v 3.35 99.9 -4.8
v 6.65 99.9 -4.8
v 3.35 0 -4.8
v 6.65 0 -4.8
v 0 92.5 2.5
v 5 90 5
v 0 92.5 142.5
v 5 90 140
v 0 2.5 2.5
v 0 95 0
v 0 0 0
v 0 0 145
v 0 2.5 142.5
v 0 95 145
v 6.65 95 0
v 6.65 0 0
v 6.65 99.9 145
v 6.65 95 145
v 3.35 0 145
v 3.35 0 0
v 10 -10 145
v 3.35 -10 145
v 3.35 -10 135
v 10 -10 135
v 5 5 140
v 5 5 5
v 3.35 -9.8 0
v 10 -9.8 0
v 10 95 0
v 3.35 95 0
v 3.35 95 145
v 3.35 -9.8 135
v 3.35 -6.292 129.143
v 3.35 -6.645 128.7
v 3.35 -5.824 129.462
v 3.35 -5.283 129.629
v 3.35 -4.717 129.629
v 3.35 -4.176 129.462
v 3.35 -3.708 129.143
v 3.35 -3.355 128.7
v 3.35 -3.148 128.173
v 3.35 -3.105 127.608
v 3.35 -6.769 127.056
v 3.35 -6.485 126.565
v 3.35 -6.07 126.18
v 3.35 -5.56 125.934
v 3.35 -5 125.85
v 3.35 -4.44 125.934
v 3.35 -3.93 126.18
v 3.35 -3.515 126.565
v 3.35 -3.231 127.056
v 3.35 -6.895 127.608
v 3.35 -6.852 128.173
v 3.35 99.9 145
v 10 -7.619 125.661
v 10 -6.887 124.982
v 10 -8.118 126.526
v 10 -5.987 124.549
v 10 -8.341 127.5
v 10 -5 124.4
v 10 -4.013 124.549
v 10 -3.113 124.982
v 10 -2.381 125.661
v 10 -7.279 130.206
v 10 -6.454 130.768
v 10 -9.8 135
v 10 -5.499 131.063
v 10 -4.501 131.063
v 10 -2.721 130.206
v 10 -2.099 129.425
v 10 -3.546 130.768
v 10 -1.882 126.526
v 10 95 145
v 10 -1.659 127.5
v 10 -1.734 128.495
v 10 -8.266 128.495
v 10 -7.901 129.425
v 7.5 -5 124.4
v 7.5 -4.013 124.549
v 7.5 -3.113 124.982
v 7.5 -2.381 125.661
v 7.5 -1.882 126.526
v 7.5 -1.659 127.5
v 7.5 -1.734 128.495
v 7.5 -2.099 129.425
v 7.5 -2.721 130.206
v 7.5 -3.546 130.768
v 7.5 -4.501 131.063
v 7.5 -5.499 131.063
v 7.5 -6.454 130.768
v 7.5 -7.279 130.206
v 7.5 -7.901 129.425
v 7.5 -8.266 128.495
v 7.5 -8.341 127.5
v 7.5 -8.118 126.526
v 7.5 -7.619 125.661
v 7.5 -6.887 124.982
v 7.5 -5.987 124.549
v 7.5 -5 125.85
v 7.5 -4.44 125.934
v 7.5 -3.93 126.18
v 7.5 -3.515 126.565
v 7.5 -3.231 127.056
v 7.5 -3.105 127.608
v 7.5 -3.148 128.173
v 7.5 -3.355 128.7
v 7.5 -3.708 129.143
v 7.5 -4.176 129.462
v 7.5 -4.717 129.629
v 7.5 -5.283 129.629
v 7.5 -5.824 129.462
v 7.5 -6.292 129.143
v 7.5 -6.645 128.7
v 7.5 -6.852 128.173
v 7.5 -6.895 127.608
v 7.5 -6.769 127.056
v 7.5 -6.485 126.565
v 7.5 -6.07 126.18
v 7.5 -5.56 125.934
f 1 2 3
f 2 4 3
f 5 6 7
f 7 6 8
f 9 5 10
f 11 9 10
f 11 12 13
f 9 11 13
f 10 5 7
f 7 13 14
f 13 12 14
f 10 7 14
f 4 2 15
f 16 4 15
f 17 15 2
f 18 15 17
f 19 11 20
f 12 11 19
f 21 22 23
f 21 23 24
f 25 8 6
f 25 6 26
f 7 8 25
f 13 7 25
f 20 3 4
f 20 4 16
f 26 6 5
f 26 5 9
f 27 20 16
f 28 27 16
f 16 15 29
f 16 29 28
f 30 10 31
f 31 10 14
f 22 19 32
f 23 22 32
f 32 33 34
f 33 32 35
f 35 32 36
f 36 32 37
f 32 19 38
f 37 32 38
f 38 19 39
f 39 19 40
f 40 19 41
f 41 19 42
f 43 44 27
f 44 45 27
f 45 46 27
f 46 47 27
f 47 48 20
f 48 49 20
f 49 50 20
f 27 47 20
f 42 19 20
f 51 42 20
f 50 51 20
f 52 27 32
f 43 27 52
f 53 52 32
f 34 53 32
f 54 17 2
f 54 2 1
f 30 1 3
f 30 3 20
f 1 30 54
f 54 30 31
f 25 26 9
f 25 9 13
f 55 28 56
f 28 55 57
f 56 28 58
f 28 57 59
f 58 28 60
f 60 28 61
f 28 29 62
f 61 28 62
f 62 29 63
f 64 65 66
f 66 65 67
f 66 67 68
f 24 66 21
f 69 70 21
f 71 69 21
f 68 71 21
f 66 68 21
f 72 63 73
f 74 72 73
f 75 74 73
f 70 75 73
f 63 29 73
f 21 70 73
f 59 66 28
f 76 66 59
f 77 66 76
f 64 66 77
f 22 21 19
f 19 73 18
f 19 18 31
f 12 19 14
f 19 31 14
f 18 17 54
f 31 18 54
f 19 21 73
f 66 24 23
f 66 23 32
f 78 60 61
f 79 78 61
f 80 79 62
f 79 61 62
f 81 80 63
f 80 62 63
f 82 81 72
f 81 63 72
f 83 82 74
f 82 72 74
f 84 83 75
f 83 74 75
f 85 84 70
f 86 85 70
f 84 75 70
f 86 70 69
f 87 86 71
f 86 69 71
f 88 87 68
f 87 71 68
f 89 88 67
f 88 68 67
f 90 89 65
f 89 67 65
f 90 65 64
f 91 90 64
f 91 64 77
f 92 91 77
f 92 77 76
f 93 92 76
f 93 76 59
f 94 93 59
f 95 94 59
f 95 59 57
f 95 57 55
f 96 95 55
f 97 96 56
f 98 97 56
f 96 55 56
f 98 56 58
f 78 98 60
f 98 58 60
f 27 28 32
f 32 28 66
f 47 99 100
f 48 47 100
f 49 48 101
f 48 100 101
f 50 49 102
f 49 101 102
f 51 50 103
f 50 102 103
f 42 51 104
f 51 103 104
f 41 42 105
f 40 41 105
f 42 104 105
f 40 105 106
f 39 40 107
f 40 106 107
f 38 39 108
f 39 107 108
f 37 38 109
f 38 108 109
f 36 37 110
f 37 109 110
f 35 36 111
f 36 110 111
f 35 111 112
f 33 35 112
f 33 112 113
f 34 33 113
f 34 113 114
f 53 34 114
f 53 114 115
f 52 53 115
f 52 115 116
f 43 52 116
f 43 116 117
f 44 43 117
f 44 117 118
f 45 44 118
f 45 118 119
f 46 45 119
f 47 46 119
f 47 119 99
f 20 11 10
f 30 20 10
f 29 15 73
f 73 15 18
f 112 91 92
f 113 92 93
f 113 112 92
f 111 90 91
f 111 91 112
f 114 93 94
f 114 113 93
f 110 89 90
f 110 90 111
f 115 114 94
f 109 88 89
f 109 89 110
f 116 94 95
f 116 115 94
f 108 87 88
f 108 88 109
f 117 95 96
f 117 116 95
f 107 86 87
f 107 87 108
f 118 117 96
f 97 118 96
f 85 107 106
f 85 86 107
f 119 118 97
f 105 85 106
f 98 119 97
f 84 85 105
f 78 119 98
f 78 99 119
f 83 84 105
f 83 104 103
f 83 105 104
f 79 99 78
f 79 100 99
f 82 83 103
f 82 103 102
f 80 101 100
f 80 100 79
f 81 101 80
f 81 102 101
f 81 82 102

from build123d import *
from OCP.BRepFilletAPI import BRepFilletAPI_MakeChamfer

# Parameters (mm, degrees)
SKETCH2_W           = 95
SKETCH2_H           = 145
BOSS_EXTRUDE1_DEPTH = 10
SKETCH3_W           = 3.3
SKETCH3_H           = 4.8
BOSS_EXTRUDE3_DEPTH = 95
SKETCH4_W           = 3.3
SKETCH4_H           = 149.8
BOSS_EXTRUDE4_DEPTH = 4.9
BOSS_EXTRUDE5_DEPTH = 10
CUT_EXTRUDE1_REACH  = 178.366
SKETCH6_R           = 1.9
SKETCH8_R           = 3.35
CUT_EXTRUDE3_DEPTH  = 2.5
CUT_EXTRUDE2_REACH  = 178.366
SKETCH7_W           = 0.2
SKETCH7_H           = 135
SKETCH9_W           = 85
SKETCH9_H           = 135
CUT_EXTRUDE4_DEPTH  = 5
CHAMFER1_SIZE       = 2.5
CHAMFER1_SIZE_2     = 5


with BuildPart() as part:
    # Sketch2 → Boss-Extrude1 (new body)
    with BuildSketch(Plane.YZ):
        with Locations((47.5, 72.5)):
            Rectangle(SKETCH2_W, SKETCH2_H)
    extrude(amount=BOSS_EXTRUDE1_DEPTH)

    # Sketch3 → Boss-Extrude3 (add)
    with BuildSketch(Plane(origin=(0, 95, 0), x_dir=(-1, 0, 0), z_dir=(0, 1, 0))):
        with Locations((-5, -2.4)):
            Rectangle(SKETCH3_W, SKETCH3_H)
    extrude(amount=-BOSS_EXTRUDE3_DEPTH)

    # Sketch4 → Boss-Extrude4 (add)
    with BuildSketch(Plane(origin=(0, 95, 0), x_dir=(-1, 0, 0), z_dir=(0, 1, 0))):
        with Locations((-5, 70.1)):
            Rectangle(SKETCH4_W, SKETCH4_H)
    extrude(amount=BOSS_EXTRUDE4_DEPTH)

    # Sketch5 → Boss-Extrude5 (add)
    with BuildSketch(Plane.XZ):
        Polygon((10, 145), (3.35, 145), (3.35, 0), (6.65, 0), (10, 0), align=None)
    extrude(amount=BOSS_EXTRUDE5_DEPTH)

    # Sketch6 → Cut-Extrude1 (cut, up to next)
    with BuildSketch(Plane.YZ.offset(10), mode=Mode.PRIVATE) as cut_extrude1_sk1:
        with Locations(Location((-5, 127.75, 0), (0, 0, 270))):
            Circle(SKETCH6_R)
    cut_extrude1_tool1 = extrude(cut_extrude1_sk1.sketch, amount=-CUT_EXTRUDE1_REACH, mode=Mode.PRIVATE) & part.part
    add(cut_extrude1_tool1.solids().sort_by_distance((10, -5, 127.75))[0], mode=Mode.SUBTRACT)

    # Sketch8 → Cut-Extrude3 (cut)
    with BuildSketch(Plane.YZ.offset(10)):
        with Locations(Location((-5, 127.75, 0), (0, 0, 270))):
            Circle(SKETCH8_R)
    extrude(amount=-CUT_EXTRUDE3_DEPTH, mode=Mode.SUBTRACT)

    # Sketch7 → Cut-Extrude2 (cut, up to next)
    with BuildSketch(Plane.YZ.offset(10), mode=Mode.PRIVATE) as cut_extrude2_sk1:
        with Locations((-9.9, 67.5)):
            Rectangle(SKETCH7_W, SKETCH7_H)
    cut_extrude2_tool1 = extrude(cut_extrude2_sk1.sketch, amount=-CUT_EXTRUDE2_REACH, mode=Mode.PRIVATE) & part.part
    add(cut_extrude2_tool1.solids().sort_by_distance((10, -9.9, 67.5))[0], mode=Mode.SUBTRACT)

    # Sketch9 → Cut-Extrude4 (cut)
    with BuildSketch(Plane(origin=(0, 0, 0), x_dir=(0, -1, 0), z_dir=(-1, 0, 0))):
        with Locations((-47.5, 72.5)):
            Rectangle(SKETCH9_W, SKETCH9_H)
    extrude(amount=-CUT_EXTRUDE4_DEPTH, mode=Mode.SUBTRACT)

    # Chamfer1
    chamfer1_edges_1 = [part.edges().sort_by_distance(p)[0] for p in [
        (0, 47.5, 5),
    ]]
    chamfer1_side_1 = [part.faces().sort_by_distance(p)[0] for p in [
        (0, 47.5, 4.95),
    ]]
    chamfer1_edges_2 = [part.edges().sort_by_distance(p)[0] for p in [
        (0, 5, 72.5),
    ]]
    chamfer1_side_2 = [part.faces().sort_by_distance(p)[0] for p in [
        (0, 4.95, 72.5),
    ]]
    chamfer1_edges_3 = [part.edges().sort_by_distance(p)[0] for p in [
        (0, 90, 72.5),
    ]]
    chamfer1_side_3 = [part.faces().sort_by_distance(p)[0] for p in [
        (0, 90.05, 72.5),
    ]]
    chamfer1_edges_4 = [part.edges().sort_by_distance(p)[0] for p in [
        (0, 47.5, 140),
    ]]
    chamfer1_side_4 = [part.faces().sort_by_distance(p)[0] for p in [
        (0, 47.5, 140.05),
    ]]
    chamfer1 = BRepFilletAPI_MakeChamfer(part.part.solid().wrapped)
    for e in chamfer1_edges_1:
        chamfer1.Add(CHAMFER1_SIZE - 0.0001, CHAMFER1_SIZE_2 - 0.0001, e.wrapped, chamfer1_side_1[0].wrapped)
    for e in chamfer1_edges_2:
        chamfer1.Add(CHAMFER1_SIZE - 0.0001, CHAMFER1_SIZE_2 - 0.0001, e.wrapped, chamfer1_side_2[0].wrapped)
    for e in chamfer1_edges_3:
        chamfer1.Add(CHAMFER1_SIZE - 0.0001, CHAMFER1_SIZE_2 - 0.0001, e.wrapped, chamfer1_side_3[0].wrapped)
    for e in chamfer1_edges_4:
        chamfer1.Add(CHAMFER1_SIZE - 0.0001, CHAMFER1_SIZE_2 - 0.0001, e.wrapped, chamfer1_side_4[0].wrapped)
    add(Compound.cast(chamfer1.Shape()), mode=Mode.REPLACE)  # a hair under: the kernel refuses the full size


solid = part.part
